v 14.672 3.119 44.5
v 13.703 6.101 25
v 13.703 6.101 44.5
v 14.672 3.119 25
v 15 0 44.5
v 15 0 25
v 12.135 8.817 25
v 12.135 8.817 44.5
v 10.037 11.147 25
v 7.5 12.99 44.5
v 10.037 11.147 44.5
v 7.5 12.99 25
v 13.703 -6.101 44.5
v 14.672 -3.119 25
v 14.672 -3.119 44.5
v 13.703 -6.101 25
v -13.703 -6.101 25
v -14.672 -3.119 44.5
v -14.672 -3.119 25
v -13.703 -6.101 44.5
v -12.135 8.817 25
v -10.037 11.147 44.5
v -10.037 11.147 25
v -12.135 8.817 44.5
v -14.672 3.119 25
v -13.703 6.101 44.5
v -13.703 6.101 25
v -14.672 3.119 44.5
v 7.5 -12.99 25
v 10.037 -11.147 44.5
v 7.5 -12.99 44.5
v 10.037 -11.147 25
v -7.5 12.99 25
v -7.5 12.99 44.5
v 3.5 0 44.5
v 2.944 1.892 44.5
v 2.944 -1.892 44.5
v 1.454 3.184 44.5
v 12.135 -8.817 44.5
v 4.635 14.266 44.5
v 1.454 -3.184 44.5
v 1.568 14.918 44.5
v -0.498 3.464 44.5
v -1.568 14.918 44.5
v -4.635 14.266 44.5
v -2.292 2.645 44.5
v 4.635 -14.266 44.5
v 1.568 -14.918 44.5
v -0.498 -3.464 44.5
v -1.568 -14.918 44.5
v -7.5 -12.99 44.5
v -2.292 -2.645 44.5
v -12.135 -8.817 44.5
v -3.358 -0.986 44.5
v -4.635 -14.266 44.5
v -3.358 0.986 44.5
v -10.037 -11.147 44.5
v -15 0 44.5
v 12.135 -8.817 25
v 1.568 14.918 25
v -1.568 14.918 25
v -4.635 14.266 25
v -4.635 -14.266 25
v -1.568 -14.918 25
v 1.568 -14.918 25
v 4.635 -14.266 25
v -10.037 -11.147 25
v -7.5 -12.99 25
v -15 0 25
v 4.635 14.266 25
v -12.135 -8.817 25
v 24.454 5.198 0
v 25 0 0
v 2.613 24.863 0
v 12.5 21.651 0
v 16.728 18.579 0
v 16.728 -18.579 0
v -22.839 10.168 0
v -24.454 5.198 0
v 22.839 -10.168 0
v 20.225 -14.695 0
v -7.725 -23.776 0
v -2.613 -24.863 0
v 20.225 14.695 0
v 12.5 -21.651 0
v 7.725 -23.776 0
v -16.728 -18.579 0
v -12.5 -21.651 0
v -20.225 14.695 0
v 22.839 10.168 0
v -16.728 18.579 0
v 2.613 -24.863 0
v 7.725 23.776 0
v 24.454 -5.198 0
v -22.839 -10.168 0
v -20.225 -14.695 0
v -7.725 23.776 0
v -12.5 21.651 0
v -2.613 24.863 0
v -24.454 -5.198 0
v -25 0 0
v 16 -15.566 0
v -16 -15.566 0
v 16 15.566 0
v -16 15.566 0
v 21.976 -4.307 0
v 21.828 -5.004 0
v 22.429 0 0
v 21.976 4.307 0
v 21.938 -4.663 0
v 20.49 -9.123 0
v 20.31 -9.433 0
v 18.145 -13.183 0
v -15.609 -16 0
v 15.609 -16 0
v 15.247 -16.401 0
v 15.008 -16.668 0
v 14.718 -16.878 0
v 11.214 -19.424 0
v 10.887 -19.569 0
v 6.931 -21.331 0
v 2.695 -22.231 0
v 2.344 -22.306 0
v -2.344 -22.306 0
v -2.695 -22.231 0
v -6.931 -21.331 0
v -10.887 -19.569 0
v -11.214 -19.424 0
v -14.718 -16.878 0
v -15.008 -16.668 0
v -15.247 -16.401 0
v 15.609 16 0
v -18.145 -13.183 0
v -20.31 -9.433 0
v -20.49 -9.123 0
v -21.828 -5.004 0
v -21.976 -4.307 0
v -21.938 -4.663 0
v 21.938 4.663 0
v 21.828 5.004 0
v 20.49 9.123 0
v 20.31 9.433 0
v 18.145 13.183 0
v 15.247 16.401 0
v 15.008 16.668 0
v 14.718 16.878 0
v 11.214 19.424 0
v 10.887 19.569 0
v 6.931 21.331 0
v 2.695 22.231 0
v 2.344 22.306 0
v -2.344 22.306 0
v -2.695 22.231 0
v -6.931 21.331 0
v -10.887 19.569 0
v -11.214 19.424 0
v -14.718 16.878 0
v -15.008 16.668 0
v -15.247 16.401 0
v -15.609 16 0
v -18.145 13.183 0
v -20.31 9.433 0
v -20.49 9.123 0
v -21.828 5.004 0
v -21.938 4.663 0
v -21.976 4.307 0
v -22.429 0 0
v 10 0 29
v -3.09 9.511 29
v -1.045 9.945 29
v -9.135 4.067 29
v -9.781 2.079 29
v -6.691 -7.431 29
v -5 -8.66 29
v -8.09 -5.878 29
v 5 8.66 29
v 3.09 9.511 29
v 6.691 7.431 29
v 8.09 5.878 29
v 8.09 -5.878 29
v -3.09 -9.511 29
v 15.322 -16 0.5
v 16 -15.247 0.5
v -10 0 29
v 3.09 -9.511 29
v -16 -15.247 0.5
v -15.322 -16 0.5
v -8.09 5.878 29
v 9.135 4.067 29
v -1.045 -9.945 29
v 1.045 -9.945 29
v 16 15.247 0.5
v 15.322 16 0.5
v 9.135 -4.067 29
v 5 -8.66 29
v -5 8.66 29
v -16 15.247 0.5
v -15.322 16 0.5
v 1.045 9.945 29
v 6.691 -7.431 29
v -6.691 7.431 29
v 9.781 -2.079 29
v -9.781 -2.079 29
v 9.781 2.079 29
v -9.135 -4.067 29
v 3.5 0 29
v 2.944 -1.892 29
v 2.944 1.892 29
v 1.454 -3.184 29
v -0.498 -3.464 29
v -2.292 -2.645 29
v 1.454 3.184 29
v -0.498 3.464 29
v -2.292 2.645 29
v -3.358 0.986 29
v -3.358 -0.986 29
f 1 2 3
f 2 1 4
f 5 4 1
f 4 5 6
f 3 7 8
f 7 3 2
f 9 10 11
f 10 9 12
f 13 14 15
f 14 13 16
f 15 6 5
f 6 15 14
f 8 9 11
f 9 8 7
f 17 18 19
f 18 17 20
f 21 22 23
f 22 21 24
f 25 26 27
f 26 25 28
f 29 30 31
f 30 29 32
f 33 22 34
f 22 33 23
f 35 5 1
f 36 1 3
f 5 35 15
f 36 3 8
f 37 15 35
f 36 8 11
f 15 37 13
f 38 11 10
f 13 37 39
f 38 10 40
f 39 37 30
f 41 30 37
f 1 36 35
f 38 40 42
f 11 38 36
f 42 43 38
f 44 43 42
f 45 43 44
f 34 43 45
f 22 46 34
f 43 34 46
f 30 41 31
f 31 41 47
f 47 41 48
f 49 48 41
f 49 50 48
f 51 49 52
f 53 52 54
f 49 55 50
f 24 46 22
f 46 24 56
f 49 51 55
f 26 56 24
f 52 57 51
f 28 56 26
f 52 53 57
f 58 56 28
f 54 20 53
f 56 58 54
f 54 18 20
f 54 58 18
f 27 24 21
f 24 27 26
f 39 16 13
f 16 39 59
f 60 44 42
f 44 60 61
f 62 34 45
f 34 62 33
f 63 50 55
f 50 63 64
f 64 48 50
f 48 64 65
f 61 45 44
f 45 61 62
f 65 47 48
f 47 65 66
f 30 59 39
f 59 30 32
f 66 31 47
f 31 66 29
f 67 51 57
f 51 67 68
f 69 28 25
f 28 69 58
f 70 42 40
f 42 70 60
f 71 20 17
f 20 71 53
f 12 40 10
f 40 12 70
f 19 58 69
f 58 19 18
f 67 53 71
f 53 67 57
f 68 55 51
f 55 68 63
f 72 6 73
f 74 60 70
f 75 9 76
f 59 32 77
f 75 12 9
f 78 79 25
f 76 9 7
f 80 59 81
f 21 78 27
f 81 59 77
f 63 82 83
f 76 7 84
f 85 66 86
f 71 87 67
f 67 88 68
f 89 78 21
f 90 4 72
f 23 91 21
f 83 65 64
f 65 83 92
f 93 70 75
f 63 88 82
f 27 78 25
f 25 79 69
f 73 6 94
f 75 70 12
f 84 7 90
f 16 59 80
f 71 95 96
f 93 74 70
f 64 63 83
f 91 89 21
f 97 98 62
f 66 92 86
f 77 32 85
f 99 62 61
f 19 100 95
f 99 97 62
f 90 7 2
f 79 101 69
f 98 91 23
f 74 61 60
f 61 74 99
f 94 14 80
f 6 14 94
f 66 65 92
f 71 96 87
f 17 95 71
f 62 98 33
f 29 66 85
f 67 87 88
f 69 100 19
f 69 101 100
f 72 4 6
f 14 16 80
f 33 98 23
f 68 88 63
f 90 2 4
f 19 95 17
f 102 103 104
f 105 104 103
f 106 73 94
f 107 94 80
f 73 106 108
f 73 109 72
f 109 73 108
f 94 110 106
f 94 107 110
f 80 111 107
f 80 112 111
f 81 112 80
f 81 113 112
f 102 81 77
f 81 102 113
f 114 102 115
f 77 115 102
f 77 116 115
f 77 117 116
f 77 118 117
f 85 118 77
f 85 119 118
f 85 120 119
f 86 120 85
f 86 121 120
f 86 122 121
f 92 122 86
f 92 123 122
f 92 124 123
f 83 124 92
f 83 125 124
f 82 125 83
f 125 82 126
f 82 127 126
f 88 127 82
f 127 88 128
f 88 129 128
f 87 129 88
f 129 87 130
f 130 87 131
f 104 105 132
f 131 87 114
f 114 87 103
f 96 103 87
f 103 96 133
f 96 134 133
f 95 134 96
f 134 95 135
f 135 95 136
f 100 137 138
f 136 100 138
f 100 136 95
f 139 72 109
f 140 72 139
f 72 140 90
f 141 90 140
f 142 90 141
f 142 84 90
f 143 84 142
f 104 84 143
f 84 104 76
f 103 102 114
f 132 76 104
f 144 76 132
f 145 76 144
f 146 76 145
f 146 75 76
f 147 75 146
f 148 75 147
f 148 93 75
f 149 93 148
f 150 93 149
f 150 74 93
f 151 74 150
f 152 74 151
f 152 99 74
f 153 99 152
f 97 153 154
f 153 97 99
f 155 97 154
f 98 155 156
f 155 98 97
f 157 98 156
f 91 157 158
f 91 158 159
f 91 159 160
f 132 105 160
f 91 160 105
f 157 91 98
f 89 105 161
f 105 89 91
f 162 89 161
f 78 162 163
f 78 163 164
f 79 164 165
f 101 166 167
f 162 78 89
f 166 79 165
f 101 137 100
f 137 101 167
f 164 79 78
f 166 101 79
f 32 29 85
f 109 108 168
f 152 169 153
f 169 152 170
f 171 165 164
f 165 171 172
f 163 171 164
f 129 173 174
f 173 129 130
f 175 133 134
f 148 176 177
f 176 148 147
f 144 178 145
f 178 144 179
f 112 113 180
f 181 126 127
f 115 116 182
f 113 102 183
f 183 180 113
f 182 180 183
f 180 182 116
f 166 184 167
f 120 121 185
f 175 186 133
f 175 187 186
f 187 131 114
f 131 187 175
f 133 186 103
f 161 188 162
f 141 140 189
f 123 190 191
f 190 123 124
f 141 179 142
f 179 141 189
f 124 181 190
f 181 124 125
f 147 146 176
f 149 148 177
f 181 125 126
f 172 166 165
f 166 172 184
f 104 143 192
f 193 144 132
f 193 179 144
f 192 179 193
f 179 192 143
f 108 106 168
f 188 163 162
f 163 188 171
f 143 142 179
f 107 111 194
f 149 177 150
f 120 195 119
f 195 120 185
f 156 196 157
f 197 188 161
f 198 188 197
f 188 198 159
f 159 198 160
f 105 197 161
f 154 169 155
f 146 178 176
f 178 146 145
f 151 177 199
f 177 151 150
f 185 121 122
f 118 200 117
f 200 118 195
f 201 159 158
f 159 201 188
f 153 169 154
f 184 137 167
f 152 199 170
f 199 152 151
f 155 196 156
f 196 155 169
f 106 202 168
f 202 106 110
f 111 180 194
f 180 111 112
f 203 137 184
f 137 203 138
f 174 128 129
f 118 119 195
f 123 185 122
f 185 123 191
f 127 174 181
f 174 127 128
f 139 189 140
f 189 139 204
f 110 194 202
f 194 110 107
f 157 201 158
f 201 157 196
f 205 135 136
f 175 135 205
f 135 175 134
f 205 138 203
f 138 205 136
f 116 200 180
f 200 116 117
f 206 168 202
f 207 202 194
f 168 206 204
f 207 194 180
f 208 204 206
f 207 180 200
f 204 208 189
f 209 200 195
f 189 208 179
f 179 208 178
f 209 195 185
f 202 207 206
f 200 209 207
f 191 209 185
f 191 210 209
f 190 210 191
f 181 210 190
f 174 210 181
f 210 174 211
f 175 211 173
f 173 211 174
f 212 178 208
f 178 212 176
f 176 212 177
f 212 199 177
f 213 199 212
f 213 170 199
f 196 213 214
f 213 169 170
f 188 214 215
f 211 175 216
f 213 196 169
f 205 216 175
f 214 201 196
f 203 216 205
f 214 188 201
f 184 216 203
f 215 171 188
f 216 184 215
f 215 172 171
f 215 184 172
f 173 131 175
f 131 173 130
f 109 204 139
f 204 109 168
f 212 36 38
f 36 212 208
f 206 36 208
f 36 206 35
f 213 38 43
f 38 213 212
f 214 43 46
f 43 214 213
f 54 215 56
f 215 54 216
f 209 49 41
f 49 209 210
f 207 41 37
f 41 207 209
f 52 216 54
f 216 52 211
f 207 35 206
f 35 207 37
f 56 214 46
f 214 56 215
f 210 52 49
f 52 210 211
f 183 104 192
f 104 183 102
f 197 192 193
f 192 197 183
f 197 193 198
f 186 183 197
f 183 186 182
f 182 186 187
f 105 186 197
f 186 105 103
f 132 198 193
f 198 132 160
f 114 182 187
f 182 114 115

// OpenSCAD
funnel2();

//funnel1();

module funnel2() {
	difference() {
		union() {
			translate([0,0,24.5])
				cylinder(r=15, h=20);
			cylinder(r1=25, r2=15, h=25);
		}
		translate([0,0,-6])
			cylinder(r1=25, r2=10, h=35);
		cylinder(r=3.5, h=70);
	}
	translate([-16,-16,0])
		cube([32, 32, 0.5]);
}

module funnel1() {
	difference() {
		union() {
			translate([0,0,20])
				cylinder(r=5, h=20);
			difference() {
				#cylinder(r1=15, r2=1, h=35);
				translate([0,0,-5])
					cylinder(r1=15, r2=1, h=35);
				translate([-20,-20,25])
					cube(size = 40);
			}
		}
		translate([0,0,35])
			cylinder(r=2, h=10);
	}
}
